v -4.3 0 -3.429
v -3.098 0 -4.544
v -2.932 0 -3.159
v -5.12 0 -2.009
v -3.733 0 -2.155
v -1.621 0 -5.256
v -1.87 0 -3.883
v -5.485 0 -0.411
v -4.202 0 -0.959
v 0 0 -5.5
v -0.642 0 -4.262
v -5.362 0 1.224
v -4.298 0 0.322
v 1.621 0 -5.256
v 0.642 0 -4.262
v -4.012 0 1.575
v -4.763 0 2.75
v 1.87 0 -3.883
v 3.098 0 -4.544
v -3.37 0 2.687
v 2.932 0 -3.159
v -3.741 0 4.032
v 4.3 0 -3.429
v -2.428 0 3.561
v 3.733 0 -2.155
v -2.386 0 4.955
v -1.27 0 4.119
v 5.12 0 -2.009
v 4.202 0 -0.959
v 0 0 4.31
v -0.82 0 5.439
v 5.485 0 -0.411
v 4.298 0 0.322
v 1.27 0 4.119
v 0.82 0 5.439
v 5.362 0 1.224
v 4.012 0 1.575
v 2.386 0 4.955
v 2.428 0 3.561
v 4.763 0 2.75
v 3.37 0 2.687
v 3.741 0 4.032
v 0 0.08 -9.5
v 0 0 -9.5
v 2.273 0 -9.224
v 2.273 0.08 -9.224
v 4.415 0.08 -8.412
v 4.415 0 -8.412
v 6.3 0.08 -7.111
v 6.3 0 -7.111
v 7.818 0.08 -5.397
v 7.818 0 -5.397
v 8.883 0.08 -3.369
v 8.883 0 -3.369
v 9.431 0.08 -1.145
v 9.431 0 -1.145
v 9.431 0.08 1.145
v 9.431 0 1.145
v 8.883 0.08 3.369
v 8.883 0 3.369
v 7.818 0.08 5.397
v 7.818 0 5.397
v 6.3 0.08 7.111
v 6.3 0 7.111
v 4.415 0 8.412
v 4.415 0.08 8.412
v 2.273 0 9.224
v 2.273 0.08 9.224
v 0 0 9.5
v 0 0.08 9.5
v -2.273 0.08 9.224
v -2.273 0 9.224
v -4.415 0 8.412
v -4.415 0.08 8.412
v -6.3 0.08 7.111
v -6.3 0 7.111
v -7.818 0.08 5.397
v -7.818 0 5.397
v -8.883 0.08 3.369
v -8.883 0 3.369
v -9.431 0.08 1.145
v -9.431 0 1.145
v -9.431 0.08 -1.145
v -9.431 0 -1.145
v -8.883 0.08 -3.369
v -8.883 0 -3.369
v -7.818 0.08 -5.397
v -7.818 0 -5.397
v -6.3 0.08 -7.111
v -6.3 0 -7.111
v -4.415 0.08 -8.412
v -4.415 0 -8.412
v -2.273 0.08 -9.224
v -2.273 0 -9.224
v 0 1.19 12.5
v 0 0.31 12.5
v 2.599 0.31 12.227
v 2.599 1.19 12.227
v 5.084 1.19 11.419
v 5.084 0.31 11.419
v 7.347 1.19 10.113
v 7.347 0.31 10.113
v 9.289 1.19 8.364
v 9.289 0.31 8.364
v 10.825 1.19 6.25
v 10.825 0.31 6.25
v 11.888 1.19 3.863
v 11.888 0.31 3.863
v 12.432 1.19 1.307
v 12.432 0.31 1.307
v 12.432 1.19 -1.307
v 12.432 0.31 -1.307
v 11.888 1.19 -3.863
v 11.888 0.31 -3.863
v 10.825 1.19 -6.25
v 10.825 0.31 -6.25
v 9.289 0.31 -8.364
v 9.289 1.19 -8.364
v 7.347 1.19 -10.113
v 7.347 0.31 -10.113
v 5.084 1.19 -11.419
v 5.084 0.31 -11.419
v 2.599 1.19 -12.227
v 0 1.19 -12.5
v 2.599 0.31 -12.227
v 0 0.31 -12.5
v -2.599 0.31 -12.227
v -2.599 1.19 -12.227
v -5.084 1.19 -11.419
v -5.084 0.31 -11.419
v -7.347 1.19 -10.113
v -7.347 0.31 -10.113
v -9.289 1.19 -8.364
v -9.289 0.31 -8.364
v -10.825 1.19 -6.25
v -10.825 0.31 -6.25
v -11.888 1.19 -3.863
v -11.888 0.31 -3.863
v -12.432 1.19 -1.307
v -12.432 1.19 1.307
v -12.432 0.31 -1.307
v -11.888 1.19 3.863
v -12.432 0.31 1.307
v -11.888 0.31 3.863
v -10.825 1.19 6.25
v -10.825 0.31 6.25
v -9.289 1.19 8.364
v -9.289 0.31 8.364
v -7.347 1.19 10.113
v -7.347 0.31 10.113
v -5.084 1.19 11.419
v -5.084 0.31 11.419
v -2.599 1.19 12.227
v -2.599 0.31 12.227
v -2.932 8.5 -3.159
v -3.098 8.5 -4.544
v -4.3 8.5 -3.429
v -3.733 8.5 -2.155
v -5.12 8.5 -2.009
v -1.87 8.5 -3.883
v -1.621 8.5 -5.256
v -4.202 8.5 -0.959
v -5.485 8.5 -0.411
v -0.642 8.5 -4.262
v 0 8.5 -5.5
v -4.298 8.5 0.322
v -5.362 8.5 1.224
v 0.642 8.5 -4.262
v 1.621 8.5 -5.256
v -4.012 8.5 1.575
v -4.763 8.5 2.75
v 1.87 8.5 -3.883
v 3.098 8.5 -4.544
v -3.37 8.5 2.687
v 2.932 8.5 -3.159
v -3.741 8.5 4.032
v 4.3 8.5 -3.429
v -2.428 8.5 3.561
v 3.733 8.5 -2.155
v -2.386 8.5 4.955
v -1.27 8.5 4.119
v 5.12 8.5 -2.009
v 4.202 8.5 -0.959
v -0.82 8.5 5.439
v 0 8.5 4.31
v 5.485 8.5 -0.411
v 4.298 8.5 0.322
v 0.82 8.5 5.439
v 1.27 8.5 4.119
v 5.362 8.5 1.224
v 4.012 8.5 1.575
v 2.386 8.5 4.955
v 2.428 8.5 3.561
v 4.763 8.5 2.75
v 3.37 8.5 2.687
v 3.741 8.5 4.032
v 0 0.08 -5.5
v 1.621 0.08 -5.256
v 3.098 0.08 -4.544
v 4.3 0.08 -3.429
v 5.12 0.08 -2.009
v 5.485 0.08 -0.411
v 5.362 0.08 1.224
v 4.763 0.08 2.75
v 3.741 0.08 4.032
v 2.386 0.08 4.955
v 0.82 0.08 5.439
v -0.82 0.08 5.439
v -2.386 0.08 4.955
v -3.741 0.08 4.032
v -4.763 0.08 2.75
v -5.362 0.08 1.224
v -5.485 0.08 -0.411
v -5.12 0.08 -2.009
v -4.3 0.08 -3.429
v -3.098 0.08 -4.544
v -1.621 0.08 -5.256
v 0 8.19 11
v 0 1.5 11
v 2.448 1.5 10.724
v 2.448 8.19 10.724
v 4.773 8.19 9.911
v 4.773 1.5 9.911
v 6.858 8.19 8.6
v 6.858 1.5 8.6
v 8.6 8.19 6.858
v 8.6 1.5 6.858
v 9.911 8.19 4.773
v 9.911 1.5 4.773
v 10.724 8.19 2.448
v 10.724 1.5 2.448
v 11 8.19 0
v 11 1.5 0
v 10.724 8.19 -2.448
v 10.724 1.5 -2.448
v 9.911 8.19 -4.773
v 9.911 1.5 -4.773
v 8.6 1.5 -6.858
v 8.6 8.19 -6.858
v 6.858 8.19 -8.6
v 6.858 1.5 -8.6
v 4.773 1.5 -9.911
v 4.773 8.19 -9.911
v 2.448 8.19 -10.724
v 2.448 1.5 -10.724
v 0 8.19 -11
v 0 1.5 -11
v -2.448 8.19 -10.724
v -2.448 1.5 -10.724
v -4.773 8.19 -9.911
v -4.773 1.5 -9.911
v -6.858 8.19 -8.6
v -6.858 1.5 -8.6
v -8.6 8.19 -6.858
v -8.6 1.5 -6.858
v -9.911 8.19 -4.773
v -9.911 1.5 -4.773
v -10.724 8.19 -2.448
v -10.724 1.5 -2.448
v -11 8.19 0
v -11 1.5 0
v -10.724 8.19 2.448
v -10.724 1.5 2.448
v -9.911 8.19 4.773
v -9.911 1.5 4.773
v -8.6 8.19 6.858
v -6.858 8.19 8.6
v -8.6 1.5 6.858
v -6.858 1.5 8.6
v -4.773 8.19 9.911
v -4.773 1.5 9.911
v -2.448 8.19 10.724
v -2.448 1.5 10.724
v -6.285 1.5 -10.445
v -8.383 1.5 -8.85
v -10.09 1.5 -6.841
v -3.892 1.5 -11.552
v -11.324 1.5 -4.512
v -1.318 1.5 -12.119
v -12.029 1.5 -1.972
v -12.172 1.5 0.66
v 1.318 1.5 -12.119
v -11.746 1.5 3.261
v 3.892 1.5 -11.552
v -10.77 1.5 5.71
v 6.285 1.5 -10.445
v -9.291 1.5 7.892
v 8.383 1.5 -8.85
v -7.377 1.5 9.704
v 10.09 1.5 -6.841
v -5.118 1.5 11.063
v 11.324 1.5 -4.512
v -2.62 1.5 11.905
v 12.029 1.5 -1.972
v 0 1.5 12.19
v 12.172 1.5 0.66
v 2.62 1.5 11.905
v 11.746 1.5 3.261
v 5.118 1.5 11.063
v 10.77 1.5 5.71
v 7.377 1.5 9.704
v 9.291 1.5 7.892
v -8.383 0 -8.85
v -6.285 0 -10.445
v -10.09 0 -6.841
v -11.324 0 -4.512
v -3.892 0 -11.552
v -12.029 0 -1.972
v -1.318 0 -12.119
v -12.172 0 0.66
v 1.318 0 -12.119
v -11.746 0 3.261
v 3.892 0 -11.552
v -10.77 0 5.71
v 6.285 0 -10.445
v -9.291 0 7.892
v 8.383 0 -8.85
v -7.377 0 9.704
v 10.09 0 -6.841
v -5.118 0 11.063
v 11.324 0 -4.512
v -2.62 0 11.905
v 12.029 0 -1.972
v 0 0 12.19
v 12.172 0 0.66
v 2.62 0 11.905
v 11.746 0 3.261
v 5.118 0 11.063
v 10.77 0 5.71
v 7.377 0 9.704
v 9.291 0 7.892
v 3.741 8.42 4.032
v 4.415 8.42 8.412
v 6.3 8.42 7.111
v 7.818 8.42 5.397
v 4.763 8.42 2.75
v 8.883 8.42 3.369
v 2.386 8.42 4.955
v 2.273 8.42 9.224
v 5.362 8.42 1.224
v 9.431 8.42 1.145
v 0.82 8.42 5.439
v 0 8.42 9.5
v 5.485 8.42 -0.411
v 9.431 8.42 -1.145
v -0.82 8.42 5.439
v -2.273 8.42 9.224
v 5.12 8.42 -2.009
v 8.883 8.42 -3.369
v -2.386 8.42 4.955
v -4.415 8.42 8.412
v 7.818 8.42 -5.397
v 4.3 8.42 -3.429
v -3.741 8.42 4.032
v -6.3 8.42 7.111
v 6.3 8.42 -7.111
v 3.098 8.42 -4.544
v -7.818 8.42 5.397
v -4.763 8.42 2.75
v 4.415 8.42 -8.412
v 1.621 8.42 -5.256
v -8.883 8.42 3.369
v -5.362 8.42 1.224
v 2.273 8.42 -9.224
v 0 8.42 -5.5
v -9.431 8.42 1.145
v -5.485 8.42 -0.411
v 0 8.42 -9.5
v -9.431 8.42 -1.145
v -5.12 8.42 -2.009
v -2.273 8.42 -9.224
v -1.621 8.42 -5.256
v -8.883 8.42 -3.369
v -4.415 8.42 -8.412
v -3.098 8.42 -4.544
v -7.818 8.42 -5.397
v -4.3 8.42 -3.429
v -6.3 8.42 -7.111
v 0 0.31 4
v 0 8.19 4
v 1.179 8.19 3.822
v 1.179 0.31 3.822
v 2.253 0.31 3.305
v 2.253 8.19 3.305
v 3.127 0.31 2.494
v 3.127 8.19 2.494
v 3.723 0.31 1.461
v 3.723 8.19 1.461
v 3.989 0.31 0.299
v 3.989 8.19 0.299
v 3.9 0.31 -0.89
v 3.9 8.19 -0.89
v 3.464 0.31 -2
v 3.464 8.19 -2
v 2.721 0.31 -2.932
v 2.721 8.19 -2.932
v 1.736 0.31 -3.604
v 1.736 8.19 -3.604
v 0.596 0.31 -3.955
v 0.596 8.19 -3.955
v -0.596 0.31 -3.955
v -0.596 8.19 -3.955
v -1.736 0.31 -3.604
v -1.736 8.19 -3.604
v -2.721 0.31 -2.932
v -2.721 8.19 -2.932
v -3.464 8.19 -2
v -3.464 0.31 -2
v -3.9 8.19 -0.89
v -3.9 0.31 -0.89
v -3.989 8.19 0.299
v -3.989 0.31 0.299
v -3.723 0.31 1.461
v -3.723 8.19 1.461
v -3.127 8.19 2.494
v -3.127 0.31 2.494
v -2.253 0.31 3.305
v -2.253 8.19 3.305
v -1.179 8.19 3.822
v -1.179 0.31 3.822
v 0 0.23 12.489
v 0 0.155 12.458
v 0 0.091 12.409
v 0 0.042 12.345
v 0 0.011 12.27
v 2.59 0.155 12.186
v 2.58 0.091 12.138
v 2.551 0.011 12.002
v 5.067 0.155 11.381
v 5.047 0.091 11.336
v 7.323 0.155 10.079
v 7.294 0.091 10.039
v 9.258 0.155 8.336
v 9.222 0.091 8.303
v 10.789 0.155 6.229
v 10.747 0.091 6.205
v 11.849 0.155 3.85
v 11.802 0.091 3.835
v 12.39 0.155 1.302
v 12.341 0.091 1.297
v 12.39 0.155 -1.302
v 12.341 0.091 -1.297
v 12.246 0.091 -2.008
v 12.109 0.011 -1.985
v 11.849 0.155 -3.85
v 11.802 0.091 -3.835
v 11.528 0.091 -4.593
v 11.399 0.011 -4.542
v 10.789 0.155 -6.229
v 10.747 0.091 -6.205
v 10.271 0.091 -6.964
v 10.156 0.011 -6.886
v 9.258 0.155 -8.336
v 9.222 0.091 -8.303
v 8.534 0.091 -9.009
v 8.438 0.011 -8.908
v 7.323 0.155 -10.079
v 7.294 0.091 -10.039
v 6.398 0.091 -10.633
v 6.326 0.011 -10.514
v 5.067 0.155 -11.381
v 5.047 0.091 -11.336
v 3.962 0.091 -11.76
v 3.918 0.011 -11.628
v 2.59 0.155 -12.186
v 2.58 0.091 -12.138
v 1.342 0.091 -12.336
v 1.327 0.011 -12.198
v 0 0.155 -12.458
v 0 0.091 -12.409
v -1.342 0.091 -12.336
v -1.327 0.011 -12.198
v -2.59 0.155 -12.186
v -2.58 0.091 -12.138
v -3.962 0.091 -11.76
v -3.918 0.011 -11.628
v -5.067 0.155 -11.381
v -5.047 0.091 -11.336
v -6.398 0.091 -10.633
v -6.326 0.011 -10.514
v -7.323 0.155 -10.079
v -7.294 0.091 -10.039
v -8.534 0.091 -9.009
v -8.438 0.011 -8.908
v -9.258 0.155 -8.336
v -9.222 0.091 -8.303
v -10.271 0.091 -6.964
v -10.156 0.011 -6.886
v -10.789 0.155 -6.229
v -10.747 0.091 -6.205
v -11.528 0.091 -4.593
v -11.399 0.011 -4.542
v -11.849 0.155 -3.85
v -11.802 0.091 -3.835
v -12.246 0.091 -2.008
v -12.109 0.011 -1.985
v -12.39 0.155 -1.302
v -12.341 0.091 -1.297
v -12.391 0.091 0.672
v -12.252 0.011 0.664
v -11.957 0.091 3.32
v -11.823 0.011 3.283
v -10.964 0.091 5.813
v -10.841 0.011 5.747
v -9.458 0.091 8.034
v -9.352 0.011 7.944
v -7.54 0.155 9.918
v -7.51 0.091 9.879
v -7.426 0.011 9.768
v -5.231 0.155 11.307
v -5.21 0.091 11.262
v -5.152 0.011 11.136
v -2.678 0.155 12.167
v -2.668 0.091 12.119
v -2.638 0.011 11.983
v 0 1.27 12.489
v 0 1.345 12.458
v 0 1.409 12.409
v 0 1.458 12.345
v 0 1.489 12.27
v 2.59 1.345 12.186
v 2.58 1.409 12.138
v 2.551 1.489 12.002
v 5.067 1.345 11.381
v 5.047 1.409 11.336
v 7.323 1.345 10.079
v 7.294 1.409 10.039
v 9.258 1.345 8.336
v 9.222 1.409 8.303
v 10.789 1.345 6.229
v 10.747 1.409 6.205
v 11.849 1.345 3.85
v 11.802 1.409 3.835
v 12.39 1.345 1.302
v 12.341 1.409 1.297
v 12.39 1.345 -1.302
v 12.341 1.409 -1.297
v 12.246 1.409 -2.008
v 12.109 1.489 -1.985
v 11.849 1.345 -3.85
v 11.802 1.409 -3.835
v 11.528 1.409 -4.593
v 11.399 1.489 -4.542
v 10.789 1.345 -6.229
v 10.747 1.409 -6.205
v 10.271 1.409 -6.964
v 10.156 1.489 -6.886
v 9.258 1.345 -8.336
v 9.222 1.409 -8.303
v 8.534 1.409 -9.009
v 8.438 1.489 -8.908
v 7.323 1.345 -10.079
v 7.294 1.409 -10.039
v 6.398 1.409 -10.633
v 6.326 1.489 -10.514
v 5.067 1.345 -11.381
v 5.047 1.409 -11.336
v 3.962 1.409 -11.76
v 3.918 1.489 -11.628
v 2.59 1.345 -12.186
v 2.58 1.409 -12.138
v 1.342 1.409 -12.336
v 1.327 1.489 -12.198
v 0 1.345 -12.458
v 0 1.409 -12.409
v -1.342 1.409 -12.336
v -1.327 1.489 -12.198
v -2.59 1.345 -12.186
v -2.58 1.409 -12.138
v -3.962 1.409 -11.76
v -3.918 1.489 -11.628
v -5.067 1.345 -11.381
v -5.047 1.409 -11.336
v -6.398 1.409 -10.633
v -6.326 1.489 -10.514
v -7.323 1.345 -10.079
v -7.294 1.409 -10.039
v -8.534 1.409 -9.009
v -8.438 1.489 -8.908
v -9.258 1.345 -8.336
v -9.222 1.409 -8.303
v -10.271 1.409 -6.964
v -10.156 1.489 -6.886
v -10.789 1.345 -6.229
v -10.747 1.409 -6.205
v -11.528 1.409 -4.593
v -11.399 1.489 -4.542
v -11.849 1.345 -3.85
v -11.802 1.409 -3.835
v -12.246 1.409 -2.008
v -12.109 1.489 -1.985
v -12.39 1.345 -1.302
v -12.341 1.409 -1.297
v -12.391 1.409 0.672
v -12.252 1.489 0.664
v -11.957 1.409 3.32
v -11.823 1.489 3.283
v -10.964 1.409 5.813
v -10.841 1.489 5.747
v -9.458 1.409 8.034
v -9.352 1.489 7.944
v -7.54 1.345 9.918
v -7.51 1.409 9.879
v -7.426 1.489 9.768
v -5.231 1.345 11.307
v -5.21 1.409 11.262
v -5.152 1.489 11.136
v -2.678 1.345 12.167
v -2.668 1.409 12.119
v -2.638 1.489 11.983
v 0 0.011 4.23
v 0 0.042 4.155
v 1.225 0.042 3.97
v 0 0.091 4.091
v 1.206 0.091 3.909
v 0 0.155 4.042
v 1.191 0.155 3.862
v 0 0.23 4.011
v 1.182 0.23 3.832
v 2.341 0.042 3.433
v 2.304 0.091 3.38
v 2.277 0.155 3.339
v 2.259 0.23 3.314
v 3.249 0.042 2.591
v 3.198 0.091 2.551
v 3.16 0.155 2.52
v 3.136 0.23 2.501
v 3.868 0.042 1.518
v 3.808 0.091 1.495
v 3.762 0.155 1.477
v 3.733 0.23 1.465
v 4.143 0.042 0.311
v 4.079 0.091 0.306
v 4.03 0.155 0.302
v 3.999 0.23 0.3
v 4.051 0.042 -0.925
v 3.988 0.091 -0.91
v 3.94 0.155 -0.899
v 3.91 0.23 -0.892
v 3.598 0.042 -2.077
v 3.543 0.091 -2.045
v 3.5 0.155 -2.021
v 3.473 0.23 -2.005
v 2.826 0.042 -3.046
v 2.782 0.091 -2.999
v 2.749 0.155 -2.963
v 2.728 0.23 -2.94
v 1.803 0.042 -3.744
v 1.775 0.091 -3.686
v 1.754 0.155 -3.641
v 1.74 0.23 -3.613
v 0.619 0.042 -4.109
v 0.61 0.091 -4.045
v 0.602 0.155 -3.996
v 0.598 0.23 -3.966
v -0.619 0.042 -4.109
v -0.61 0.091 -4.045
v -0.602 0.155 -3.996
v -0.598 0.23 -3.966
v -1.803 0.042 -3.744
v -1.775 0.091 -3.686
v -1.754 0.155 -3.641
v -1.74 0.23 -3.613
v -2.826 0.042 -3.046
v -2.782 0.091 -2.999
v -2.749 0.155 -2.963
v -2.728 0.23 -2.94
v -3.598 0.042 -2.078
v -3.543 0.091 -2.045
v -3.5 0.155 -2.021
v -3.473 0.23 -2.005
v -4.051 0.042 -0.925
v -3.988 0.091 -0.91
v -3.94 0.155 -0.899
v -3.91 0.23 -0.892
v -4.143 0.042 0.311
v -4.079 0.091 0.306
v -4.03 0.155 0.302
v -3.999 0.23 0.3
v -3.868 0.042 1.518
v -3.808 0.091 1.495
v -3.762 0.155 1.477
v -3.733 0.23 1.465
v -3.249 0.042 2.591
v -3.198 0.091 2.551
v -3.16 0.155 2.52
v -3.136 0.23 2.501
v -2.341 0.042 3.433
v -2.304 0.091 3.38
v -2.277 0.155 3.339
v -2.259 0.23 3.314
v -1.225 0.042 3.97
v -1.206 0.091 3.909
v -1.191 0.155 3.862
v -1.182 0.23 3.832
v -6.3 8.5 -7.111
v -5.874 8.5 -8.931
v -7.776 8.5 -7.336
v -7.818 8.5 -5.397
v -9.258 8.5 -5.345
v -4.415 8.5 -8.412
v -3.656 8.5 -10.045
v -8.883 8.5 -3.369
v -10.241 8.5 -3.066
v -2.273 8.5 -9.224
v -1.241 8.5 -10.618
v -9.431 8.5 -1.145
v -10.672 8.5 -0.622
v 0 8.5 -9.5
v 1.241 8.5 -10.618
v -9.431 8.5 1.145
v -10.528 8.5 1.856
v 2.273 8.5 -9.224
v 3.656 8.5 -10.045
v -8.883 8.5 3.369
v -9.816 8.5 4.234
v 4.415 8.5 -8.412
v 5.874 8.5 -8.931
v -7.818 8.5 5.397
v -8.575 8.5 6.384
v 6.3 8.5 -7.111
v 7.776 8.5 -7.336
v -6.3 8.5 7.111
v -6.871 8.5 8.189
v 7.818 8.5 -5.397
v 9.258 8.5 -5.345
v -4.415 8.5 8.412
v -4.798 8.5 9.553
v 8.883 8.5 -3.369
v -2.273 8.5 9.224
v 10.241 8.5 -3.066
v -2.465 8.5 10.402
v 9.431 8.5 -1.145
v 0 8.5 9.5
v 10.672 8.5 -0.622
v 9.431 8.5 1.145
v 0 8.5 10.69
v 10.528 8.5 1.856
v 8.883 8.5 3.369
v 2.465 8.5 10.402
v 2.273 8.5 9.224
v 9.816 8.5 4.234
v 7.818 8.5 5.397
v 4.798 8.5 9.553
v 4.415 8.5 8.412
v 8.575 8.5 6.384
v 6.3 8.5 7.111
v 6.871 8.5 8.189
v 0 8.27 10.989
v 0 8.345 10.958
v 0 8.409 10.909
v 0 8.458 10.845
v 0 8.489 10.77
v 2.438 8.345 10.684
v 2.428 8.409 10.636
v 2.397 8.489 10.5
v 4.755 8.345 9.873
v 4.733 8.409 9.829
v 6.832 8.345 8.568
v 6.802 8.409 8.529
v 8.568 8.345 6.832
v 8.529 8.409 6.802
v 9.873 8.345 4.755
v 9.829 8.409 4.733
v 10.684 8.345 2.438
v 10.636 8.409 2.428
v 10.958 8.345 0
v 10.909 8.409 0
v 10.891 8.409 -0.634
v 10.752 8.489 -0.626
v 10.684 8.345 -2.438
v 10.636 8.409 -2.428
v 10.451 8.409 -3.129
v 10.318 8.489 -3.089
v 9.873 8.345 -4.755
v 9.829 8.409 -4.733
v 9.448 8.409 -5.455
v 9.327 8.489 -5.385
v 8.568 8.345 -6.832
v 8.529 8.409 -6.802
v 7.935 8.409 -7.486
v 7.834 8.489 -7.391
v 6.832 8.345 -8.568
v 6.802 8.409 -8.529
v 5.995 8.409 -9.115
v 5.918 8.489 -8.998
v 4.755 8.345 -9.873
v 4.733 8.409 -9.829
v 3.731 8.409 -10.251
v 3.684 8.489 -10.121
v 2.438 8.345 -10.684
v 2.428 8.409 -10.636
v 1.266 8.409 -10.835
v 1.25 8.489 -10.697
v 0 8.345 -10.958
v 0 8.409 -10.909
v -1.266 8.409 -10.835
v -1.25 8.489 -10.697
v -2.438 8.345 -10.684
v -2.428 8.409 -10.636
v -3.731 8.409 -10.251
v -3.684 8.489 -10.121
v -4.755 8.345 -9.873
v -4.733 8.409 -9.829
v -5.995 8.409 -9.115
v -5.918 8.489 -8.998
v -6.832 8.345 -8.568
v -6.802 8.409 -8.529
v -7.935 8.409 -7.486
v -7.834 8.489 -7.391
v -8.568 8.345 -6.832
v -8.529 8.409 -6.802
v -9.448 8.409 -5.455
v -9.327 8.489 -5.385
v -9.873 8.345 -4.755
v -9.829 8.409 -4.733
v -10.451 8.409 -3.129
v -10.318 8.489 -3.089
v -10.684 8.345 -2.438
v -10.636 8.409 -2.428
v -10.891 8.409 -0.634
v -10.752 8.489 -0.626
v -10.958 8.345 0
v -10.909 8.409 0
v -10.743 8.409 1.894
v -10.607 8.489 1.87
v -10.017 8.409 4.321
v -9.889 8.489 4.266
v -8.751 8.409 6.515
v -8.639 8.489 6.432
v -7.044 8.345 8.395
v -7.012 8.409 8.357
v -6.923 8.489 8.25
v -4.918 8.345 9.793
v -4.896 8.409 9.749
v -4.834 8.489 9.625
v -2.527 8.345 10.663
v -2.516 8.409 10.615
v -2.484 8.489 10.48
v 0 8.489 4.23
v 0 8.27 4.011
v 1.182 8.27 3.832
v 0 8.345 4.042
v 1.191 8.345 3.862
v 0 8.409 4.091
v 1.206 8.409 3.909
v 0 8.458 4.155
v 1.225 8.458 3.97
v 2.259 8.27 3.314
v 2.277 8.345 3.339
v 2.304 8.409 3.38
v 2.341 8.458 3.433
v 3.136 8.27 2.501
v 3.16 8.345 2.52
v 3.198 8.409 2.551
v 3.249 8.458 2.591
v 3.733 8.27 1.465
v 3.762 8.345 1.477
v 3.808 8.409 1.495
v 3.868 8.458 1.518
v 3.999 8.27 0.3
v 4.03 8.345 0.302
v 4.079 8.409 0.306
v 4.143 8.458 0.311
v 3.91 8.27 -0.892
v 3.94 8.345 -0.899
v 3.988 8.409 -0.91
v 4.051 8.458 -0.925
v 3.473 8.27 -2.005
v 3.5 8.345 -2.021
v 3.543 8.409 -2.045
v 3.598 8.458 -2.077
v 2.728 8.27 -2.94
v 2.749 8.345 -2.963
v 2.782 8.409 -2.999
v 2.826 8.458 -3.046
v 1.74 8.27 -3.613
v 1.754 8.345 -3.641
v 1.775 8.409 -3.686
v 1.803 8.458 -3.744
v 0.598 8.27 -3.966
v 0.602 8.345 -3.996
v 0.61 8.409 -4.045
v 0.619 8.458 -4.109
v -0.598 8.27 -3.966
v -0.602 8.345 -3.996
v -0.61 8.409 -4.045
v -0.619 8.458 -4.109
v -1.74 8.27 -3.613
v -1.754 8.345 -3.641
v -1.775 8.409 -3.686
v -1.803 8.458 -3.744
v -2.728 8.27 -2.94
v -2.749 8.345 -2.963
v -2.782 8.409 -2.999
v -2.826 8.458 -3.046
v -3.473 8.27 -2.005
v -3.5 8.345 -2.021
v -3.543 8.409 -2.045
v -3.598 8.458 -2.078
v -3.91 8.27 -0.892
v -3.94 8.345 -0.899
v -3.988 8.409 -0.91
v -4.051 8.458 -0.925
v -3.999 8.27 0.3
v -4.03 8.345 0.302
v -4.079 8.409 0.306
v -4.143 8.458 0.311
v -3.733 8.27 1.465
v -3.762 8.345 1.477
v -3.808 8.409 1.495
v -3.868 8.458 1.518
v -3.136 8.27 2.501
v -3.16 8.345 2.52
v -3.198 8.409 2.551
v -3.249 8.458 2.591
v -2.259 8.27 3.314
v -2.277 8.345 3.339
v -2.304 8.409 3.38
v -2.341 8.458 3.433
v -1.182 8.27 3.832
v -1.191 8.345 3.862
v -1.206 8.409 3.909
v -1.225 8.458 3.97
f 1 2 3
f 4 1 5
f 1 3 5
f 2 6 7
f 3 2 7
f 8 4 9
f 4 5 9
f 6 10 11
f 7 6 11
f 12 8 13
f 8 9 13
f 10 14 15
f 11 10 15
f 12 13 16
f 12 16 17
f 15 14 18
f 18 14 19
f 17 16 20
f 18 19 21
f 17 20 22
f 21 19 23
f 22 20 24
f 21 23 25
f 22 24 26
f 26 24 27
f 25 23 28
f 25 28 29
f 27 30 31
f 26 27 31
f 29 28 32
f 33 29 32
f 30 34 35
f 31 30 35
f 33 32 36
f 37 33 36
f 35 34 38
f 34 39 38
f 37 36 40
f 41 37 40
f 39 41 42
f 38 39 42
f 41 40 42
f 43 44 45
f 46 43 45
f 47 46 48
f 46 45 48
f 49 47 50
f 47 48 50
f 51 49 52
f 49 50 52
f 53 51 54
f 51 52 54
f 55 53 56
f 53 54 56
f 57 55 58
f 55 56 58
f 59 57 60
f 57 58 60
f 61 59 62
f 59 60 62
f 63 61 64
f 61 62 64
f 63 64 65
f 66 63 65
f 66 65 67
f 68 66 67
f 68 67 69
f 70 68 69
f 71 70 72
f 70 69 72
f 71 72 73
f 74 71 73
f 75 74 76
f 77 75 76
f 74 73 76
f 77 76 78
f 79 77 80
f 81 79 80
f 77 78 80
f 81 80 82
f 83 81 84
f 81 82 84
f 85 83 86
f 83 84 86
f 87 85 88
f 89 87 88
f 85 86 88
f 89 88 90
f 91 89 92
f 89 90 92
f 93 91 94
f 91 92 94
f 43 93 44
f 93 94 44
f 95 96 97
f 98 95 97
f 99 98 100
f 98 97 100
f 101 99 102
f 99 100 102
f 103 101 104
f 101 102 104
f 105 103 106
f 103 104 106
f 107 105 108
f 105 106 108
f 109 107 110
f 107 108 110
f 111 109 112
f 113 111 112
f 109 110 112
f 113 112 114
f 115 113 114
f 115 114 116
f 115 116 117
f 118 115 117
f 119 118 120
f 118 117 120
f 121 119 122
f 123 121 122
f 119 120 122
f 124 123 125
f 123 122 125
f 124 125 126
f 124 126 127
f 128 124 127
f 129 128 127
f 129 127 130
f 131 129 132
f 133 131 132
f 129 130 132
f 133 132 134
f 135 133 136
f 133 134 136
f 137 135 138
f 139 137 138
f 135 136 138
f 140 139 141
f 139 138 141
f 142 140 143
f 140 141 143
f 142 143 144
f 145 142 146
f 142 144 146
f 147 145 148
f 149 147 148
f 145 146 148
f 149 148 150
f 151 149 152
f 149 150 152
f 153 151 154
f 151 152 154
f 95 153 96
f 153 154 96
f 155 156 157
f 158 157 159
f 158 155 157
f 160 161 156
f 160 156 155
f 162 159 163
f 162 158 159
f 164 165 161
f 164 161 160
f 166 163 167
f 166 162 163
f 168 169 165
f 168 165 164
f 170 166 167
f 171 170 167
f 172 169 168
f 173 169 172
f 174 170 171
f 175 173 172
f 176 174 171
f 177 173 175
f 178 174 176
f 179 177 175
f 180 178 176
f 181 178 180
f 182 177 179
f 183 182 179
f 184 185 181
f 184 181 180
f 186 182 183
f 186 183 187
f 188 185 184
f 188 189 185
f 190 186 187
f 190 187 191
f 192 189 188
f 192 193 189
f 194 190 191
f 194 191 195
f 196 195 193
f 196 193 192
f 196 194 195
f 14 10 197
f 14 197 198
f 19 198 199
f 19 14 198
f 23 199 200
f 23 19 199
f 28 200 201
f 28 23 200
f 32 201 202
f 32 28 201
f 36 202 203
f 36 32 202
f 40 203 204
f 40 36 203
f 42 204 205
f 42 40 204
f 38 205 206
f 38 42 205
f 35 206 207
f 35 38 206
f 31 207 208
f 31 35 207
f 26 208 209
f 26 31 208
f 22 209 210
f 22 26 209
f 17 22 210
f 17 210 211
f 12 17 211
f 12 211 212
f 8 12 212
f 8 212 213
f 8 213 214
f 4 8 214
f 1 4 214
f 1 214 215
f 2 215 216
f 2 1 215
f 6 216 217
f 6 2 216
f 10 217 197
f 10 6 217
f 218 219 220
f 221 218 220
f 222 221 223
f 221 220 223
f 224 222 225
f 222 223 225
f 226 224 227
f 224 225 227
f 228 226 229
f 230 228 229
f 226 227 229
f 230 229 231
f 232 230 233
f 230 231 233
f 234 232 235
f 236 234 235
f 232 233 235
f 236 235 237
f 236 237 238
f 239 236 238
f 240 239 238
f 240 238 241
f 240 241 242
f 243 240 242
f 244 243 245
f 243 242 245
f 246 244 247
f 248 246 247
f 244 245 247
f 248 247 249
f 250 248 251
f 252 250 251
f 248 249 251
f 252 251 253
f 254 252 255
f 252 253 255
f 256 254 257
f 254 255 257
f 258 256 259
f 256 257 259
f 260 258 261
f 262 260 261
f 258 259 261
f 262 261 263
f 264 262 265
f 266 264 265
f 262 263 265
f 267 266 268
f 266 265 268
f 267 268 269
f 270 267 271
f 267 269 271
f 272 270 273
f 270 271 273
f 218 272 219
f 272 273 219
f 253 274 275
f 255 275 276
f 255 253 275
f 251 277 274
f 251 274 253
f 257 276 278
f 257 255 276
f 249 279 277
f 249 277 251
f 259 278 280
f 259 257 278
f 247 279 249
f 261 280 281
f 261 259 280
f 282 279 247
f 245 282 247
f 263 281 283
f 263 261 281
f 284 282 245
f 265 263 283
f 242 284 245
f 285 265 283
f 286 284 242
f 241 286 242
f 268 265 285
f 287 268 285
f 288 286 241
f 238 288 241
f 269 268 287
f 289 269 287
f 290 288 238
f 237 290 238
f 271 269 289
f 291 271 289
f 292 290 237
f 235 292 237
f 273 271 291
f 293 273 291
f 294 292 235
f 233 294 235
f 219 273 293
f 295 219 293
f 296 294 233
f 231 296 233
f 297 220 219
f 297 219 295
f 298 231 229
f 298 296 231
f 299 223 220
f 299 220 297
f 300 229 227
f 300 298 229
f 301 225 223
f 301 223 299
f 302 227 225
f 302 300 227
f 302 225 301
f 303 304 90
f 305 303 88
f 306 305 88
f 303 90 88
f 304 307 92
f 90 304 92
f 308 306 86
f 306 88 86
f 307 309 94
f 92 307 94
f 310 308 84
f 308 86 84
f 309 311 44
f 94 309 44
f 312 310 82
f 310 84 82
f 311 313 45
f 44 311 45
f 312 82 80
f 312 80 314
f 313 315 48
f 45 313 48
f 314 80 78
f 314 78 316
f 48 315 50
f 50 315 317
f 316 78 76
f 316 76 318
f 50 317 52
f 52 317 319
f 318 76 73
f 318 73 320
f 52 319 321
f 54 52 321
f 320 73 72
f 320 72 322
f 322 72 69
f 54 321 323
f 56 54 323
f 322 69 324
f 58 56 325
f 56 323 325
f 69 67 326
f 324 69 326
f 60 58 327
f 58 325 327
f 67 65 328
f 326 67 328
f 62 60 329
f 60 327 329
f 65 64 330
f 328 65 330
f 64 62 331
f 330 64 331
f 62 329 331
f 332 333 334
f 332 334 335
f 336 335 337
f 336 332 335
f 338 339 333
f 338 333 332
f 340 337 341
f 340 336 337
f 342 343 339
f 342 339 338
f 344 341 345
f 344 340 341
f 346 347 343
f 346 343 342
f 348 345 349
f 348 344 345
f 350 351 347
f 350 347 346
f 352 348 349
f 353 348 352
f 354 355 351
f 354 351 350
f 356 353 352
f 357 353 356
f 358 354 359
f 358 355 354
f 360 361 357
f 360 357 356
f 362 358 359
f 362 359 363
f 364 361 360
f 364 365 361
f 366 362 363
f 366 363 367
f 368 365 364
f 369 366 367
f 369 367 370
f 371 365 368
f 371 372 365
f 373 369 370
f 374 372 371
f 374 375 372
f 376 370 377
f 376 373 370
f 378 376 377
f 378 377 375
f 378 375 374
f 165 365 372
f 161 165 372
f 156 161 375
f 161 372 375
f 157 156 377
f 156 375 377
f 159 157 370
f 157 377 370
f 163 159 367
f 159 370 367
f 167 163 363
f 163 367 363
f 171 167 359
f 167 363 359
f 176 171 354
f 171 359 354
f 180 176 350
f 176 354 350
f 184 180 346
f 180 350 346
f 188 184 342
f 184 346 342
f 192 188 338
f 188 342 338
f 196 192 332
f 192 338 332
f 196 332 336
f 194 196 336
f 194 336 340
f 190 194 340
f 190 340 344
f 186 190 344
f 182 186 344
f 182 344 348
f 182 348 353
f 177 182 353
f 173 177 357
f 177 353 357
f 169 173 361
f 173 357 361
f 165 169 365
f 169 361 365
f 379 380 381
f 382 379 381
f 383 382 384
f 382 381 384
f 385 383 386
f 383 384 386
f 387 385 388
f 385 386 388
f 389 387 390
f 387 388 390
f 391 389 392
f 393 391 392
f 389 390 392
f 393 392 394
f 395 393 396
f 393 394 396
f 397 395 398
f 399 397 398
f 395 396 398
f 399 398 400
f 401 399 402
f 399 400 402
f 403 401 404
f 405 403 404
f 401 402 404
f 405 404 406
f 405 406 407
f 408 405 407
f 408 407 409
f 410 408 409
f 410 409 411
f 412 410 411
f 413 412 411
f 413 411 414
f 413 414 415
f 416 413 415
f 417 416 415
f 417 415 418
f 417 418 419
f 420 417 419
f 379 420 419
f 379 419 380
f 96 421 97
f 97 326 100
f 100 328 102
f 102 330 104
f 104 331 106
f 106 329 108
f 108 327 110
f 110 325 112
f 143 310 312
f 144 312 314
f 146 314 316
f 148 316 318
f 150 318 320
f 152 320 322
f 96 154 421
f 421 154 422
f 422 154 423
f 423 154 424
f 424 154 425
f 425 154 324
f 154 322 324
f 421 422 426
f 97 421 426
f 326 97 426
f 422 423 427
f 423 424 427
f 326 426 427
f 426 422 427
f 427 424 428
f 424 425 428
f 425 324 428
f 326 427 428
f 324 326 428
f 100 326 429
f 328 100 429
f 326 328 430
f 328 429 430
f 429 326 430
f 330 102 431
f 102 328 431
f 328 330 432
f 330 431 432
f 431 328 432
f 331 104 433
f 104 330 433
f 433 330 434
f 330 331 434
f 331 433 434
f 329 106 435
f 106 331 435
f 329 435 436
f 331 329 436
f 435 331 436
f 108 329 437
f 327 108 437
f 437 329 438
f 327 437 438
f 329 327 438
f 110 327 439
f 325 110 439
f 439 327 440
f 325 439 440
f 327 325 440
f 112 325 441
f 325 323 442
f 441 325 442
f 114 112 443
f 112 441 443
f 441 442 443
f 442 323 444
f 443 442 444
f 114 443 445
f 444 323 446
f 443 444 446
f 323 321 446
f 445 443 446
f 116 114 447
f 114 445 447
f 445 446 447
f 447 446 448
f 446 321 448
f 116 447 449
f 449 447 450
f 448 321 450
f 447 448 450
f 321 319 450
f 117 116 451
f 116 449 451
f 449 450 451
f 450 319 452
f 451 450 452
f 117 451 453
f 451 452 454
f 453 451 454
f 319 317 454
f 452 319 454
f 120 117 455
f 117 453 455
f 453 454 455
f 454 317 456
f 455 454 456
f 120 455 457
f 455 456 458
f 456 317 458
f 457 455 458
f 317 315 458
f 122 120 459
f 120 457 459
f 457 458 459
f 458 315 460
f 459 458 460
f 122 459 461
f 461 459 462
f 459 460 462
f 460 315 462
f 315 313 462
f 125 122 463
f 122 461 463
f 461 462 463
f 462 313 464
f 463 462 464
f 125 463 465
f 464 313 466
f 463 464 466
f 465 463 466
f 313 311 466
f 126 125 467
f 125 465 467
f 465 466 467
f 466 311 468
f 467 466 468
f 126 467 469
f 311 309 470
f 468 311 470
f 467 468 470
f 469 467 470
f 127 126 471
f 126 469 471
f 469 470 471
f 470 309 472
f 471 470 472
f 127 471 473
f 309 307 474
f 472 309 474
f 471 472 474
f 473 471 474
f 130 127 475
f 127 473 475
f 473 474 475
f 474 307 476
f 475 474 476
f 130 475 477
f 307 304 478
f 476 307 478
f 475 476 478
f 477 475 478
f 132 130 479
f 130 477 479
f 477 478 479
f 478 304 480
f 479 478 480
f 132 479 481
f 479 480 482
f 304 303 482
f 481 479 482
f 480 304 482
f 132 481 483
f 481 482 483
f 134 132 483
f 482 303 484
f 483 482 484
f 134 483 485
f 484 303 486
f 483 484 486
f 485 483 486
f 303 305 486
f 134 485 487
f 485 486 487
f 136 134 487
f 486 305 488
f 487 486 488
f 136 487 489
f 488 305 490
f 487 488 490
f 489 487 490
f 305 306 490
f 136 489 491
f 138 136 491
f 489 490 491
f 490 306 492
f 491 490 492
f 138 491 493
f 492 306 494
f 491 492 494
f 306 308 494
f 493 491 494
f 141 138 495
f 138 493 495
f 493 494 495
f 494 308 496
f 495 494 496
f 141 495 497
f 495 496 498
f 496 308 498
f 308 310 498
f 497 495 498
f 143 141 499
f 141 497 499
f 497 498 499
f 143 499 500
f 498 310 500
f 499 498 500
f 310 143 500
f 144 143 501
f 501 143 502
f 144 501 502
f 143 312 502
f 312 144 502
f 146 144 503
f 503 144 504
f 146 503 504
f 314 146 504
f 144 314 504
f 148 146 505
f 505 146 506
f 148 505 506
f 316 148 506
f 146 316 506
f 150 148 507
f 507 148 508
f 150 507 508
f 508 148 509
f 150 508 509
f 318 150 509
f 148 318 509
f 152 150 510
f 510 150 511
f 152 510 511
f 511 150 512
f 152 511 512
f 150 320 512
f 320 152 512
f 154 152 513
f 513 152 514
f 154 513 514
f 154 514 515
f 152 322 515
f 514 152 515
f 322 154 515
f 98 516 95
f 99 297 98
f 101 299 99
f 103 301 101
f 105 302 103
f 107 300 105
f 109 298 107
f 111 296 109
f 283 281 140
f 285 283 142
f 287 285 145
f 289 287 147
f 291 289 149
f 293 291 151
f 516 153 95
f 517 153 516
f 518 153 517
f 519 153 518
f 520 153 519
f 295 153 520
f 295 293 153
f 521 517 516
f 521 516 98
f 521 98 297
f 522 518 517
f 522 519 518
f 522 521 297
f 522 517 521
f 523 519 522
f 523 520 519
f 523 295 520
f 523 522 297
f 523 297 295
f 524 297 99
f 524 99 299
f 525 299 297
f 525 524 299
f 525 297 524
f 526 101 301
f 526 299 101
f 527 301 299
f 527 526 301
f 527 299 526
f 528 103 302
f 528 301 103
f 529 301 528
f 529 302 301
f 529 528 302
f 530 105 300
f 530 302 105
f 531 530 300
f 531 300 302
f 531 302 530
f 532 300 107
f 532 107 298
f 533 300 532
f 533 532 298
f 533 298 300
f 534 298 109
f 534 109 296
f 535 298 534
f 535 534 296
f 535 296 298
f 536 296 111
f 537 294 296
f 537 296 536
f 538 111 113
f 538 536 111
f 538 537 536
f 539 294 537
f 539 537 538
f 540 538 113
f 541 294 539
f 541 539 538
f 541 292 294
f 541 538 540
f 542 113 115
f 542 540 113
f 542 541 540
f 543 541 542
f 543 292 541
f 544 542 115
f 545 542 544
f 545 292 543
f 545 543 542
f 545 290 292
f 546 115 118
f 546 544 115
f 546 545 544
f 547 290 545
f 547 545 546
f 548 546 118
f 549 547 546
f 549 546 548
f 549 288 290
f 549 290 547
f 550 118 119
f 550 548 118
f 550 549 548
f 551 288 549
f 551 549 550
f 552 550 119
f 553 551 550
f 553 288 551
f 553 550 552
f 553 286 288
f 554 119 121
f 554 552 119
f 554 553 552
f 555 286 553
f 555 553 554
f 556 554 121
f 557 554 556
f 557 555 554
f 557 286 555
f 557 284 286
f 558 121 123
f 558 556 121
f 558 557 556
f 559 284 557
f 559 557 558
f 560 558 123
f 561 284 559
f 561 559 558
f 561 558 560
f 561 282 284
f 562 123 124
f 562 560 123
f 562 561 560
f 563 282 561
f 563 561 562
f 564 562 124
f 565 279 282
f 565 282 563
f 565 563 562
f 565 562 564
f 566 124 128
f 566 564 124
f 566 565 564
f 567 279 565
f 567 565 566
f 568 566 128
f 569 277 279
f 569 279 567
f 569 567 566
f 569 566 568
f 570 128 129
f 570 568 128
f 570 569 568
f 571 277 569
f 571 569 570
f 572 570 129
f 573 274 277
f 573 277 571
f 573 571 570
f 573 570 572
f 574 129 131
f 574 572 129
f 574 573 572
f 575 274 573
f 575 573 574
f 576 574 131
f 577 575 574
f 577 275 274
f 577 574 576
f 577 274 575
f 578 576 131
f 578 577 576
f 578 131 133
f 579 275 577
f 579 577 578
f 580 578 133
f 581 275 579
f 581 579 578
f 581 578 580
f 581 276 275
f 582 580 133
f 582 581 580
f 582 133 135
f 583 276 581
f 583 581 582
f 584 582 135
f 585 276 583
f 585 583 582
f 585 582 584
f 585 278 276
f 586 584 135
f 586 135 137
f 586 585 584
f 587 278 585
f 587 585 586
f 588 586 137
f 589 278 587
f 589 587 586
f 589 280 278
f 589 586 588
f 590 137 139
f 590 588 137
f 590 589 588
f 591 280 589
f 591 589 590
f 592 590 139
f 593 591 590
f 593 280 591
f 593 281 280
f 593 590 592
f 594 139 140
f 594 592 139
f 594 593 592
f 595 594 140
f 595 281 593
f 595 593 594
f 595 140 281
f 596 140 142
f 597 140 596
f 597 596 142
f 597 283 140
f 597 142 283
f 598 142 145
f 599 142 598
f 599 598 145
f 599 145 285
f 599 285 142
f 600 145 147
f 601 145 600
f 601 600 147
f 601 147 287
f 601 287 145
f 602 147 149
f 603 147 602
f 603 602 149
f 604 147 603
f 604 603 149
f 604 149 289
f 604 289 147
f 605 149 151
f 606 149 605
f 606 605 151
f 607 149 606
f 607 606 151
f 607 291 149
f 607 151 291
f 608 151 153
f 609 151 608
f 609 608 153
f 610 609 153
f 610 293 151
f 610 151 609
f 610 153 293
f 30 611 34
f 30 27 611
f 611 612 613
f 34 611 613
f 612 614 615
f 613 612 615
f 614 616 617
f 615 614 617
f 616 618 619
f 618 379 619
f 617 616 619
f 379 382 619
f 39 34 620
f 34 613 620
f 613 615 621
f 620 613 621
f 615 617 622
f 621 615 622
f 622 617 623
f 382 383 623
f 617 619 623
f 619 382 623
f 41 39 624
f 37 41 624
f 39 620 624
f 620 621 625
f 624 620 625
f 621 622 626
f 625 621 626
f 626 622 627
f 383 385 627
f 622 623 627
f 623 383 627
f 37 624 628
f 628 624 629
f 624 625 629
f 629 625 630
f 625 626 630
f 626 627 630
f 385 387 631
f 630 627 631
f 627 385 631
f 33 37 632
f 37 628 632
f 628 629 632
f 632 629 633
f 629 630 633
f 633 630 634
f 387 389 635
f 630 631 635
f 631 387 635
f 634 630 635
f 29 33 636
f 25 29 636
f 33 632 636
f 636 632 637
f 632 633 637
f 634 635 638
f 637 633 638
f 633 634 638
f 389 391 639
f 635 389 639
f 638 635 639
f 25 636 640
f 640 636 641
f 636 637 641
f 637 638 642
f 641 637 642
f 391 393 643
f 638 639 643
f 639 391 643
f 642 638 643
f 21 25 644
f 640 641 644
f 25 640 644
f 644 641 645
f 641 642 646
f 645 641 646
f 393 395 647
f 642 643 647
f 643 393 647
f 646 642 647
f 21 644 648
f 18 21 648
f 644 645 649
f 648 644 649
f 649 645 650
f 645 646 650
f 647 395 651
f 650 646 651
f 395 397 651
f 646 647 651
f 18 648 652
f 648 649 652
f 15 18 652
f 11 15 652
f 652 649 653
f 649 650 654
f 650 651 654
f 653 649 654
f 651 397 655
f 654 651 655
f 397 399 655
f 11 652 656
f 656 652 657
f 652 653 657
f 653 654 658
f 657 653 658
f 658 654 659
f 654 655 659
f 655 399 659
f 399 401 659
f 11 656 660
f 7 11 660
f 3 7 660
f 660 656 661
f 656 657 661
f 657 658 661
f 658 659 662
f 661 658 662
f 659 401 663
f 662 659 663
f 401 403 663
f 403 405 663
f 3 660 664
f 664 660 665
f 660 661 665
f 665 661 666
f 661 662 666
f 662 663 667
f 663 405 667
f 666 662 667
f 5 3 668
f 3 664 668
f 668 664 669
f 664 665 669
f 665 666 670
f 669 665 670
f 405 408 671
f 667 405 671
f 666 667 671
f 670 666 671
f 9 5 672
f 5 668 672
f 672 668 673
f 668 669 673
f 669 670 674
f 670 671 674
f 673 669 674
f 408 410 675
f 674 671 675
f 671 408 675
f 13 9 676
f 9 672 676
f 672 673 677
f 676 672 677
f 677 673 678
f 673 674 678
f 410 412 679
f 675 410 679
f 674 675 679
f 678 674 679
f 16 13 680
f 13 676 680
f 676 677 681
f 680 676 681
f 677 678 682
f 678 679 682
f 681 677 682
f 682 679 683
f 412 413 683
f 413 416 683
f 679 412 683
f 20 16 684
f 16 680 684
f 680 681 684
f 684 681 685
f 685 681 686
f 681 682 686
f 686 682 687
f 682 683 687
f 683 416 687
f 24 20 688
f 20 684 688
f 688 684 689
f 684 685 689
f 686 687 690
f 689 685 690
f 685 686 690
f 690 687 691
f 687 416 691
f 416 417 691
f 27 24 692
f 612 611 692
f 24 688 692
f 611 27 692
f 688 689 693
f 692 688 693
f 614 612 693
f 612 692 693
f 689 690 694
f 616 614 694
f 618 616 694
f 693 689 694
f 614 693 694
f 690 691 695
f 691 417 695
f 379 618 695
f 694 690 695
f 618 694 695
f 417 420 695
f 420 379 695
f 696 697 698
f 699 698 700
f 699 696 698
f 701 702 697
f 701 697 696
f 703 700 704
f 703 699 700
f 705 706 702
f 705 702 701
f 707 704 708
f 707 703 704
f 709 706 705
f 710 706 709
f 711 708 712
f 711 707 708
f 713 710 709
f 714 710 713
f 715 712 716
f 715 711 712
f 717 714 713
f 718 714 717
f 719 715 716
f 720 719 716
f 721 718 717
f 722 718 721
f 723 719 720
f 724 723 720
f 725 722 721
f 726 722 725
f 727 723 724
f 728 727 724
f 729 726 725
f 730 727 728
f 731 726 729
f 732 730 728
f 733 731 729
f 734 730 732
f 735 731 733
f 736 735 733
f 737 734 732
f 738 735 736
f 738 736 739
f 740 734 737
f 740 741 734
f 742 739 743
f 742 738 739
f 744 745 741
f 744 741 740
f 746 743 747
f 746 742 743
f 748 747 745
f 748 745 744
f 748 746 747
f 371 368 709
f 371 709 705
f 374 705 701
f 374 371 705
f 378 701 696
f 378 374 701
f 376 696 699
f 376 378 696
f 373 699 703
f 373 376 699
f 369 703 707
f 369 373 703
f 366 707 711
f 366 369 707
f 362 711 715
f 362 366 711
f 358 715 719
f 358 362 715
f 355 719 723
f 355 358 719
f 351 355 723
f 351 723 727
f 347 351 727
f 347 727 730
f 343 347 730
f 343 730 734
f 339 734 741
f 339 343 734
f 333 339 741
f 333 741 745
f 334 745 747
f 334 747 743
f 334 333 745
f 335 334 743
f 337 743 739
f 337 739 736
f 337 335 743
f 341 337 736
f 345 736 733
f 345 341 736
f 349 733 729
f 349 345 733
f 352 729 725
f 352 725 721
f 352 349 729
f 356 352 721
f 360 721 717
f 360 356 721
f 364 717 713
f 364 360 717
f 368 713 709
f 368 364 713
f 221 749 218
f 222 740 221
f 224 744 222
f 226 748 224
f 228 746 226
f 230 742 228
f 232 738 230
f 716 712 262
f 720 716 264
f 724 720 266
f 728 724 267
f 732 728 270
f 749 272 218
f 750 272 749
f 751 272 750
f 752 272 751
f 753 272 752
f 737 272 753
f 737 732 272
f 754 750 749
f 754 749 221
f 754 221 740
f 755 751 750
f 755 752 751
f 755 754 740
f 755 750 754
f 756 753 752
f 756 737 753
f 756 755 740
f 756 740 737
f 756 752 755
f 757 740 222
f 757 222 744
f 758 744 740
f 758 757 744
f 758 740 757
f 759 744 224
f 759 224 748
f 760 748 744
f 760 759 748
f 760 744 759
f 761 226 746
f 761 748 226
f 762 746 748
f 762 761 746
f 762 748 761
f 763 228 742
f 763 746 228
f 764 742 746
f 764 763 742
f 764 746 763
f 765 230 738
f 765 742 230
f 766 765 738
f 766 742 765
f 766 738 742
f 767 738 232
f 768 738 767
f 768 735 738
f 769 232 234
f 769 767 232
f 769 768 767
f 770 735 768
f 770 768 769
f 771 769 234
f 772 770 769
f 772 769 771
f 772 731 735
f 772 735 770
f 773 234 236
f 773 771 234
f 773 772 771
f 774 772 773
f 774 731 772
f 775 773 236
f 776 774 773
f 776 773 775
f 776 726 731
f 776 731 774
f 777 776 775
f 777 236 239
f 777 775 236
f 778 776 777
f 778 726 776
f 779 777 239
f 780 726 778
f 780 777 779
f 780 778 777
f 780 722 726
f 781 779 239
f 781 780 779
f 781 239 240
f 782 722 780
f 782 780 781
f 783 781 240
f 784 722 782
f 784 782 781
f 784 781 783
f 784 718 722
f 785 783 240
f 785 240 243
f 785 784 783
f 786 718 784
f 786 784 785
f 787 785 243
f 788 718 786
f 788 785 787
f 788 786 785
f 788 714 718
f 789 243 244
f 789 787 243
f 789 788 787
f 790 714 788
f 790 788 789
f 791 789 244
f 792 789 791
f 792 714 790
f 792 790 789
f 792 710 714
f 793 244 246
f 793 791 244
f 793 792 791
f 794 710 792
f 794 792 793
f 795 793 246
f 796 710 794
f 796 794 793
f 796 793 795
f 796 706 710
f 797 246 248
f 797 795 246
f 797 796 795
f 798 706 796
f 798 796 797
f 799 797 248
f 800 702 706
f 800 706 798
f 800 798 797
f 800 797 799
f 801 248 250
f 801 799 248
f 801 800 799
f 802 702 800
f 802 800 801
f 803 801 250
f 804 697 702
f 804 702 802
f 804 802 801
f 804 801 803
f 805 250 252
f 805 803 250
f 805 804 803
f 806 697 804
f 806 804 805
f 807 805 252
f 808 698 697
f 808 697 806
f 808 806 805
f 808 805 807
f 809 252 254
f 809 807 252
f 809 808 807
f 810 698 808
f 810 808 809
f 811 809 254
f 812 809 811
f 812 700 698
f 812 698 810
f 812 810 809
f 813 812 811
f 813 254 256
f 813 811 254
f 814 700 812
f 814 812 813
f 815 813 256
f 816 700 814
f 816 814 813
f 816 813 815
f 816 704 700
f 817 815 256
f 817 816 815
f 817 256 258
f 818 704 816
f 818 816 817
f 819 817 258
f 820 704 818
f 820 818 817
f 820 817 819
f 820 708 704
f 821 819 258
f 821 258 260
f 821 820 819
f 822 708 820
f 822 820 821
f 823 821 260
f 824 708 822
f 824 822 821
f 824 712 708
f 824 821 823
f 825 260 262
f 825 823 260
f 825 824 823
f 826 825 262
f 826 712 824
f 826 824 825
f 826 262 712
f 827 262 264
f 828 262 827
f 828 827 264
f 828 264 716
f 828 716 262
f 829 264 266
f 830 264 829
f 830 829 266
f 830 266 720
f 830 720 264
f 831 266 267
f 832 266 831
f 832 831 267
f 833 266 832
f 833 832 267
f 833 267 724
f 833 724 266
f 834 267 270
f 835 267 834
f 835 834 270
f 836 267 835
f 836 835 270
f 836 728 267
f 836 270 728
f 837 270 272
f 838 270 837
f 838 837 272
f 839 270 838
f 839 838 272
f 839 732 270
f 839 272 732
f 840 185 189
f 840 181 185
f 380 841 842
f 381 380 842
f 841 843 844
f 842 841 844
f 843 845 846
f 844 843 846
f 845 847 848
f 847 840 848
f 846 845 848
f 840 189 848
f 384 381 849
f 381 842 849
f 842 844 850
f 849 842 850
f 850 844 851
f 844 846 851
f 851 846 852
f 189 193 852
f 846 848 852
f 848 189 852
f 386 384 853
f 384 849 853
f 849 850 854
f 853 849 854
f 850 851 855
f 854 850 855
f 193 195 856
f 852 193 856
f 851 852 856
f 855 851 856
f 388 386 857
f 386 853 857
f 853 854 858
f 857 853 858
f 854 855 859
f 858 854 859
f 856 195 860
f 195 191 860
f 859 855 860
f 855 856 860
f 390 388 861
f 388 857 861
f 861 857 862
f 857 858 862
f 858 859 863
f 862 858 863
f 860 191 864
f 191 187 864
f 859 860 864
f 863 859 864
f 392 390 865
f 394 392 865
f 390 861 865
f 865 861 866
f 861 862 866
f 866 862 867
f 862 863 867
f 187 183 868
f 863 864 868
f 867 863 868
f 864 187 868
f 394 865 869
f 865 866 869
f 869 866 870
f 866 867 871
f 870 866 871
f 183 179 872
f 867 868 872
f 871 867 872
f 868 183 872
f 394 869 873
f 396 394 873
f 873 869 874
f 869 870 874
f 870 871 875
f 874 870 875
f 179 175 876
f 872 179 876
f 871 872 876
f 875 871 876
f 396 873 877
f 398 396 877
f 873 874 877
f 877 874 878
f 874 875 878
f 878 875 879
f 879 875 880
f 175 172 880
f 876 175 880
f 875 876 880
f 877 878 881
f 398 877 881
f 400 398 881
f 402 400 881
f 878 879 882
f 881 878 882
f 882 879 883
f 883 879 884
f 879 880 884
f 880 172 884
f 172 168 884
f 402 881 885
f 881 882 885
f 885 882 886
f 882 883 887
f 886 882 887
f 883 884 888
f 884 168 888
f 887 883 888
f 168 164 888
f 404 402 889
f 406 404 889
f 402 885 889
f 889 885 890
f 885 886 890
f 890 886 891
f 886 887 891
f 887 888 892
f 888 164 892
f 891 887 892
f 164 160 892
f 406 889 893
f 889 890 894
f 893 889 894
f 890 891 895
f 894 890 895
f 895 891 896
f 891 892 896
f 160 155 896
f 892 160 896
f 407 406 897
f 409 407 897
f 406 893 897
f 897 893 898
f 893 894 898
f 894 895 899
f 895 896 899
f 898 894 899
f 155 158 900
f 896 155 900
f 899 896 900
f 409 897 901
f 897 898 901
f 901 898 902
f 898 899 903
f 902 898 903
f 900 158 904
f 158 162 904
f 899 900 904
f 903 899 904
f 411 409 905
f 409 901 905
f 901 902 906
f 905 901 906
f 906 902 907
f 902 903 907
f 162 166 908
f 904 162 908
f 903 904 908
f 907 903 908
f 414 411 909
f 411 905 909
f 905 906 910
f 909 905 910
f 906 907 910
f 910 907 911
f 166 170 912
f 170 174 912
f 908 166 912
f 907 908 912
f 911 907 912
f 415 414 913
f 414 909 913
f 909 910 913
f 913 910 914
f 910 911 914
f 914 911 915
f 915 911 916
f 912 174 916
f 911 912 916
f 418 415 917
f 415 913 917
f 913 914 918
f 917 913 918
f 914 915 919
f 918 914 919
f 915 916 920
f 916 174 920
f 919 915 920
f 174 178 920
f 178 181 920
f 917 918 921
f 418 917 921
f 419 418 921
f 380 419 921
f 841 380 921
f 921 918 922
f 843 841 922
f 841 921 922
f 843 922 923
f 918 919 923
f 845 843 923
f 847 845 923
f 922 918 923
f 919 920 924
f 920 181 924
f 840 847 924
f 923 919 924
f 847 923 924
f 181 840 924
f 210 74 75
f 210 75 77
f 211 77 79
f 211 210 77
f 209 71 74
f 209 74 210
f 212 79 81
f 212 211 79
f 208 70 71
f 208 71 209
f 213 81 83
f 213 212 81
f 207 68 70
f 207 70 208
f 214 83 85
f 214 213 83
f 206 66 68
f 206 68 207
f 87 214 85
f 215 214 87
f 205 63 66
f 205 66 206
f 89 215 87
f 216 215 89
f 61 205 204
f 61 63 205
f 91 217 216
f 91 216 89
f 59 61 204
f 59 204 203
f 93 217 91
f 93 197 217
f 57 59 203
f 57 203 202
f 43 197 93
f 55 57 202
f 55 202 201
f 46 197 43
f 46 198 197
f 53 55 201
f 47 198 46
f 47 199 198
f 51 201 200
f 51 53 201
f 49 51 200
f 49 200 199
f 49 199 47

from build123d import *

# Parameters (mm, degrees)
SKETCH1_R           = 12.5
BOSS_EXTRUDE1_DEPTH = 1.5
SKETCH2_R           = 11
BOSS_EXTRUDE2_DEPTH = 7
SKETCH3_R           = 4
CUT_EXTRUDE1_DEPTH  = 20.615045246
SKETCH4_R           = 9.5
SKETCH4_R_2         = 5.5
CUT_EXTRUDE2_DEPTH  = 0.08
CUT_EXTRUDE3_START  = -0.08
SKETCH5_R           = 9.5
SKETCH5_R_2         = 5.5
CUT_EXTRUDE3_DEPTH  = 0.08
FILLET1_R           = 0.31


with BuildPart() as part:
    # Sketch1 → Boss-Extrude1 (new body)
    with BuildSketch(Plane(origin=(0, 0, 0), x_dir=(1, 0, 0), z_dir=(0, 1, 0))):
        with Locations(Location((0, 0, 0), (0, 0, 270))):
            Circle(SKETCH1_R)
    extrude(amount=BOSS_EXTRUDE1_DEPTH)

    # Sketch2 → Boss-Extrude2 (add)
    with BuildSketch(Plane(origin=(0, 1.5, 0), x_dir=(1, 0, 0), z_dir=(0, 1, 0))):
        with Locations(Location((0, 0, 0), (0, 0, 270))):
            Circle(SKETCH2_R)
    extrude(amount=BOSS_EXTRUDE2_DEPTH)

    # Sketch3 → Cut-Extrude1 (cut, through all)
    with BuildSketch(Plane(origin=(0, 8.5, 0), x_dir=(1, 0, 0), z_dir=(0, 1, 0))):
        with Locations(Location((0, 0, 0), (0, 0, 270))):
            Circle(SKETCH3_R)
    extrude(amount=-CUT_EXTRUDE1_DEPTH, mode=Mode.SUBTRACT)

    # Sketch4 → Cut-Extrude2 (cut)
    with BuildSketch(Plane.XZ):
        with Locations(Location((0, 0, 0), (0, 0, 270))):
            Circle(SKETCH4_R)
        with Locations(Location((0, 0, 0), (0, 0, 270))):
            Circle(SKETCH4_R_2, mode=Mode.SUBTRACT)
    extrude(amount=-CUT_EXTRUDE2_DEPTH, mode=Mode.SUBTRACT)

    # Sketch5 → Cut-Extrude3 (cut)
    with BuildSketch(Plane(origin=(0, 8.5, 0), x_dir=(1, 0, 0), z_dir=(0, 1, 0)).offset(CUT_EXTRUDE3_START)):
        with Locations(Location((0, 0, 0), (0, 0, 90))):
            Circle(SKETCH5_R)
        with Locations(Location((0, 0, 0), (0, 0, 90))):
            Circle(SKETCH5_R_2, mode=Mode.SUBTRACT)
    extrude(amount=CUT_EXTRUDE3_DEPTH, mode=Mode.SUBTRACT)

    # Fillet1
    fillet1_edges = [part.edges().sort_by_distance(p)[0] for p in [
        (0, 0, -4),
        (0, 8.5, -4),
        (0, 0, -12.5),
        (0, 1.5, -12.5),
        (0, 8.5, -11),
    ]]
    fillet(fillet1_edges, radius=FILLET1_R)


solid = part.part
